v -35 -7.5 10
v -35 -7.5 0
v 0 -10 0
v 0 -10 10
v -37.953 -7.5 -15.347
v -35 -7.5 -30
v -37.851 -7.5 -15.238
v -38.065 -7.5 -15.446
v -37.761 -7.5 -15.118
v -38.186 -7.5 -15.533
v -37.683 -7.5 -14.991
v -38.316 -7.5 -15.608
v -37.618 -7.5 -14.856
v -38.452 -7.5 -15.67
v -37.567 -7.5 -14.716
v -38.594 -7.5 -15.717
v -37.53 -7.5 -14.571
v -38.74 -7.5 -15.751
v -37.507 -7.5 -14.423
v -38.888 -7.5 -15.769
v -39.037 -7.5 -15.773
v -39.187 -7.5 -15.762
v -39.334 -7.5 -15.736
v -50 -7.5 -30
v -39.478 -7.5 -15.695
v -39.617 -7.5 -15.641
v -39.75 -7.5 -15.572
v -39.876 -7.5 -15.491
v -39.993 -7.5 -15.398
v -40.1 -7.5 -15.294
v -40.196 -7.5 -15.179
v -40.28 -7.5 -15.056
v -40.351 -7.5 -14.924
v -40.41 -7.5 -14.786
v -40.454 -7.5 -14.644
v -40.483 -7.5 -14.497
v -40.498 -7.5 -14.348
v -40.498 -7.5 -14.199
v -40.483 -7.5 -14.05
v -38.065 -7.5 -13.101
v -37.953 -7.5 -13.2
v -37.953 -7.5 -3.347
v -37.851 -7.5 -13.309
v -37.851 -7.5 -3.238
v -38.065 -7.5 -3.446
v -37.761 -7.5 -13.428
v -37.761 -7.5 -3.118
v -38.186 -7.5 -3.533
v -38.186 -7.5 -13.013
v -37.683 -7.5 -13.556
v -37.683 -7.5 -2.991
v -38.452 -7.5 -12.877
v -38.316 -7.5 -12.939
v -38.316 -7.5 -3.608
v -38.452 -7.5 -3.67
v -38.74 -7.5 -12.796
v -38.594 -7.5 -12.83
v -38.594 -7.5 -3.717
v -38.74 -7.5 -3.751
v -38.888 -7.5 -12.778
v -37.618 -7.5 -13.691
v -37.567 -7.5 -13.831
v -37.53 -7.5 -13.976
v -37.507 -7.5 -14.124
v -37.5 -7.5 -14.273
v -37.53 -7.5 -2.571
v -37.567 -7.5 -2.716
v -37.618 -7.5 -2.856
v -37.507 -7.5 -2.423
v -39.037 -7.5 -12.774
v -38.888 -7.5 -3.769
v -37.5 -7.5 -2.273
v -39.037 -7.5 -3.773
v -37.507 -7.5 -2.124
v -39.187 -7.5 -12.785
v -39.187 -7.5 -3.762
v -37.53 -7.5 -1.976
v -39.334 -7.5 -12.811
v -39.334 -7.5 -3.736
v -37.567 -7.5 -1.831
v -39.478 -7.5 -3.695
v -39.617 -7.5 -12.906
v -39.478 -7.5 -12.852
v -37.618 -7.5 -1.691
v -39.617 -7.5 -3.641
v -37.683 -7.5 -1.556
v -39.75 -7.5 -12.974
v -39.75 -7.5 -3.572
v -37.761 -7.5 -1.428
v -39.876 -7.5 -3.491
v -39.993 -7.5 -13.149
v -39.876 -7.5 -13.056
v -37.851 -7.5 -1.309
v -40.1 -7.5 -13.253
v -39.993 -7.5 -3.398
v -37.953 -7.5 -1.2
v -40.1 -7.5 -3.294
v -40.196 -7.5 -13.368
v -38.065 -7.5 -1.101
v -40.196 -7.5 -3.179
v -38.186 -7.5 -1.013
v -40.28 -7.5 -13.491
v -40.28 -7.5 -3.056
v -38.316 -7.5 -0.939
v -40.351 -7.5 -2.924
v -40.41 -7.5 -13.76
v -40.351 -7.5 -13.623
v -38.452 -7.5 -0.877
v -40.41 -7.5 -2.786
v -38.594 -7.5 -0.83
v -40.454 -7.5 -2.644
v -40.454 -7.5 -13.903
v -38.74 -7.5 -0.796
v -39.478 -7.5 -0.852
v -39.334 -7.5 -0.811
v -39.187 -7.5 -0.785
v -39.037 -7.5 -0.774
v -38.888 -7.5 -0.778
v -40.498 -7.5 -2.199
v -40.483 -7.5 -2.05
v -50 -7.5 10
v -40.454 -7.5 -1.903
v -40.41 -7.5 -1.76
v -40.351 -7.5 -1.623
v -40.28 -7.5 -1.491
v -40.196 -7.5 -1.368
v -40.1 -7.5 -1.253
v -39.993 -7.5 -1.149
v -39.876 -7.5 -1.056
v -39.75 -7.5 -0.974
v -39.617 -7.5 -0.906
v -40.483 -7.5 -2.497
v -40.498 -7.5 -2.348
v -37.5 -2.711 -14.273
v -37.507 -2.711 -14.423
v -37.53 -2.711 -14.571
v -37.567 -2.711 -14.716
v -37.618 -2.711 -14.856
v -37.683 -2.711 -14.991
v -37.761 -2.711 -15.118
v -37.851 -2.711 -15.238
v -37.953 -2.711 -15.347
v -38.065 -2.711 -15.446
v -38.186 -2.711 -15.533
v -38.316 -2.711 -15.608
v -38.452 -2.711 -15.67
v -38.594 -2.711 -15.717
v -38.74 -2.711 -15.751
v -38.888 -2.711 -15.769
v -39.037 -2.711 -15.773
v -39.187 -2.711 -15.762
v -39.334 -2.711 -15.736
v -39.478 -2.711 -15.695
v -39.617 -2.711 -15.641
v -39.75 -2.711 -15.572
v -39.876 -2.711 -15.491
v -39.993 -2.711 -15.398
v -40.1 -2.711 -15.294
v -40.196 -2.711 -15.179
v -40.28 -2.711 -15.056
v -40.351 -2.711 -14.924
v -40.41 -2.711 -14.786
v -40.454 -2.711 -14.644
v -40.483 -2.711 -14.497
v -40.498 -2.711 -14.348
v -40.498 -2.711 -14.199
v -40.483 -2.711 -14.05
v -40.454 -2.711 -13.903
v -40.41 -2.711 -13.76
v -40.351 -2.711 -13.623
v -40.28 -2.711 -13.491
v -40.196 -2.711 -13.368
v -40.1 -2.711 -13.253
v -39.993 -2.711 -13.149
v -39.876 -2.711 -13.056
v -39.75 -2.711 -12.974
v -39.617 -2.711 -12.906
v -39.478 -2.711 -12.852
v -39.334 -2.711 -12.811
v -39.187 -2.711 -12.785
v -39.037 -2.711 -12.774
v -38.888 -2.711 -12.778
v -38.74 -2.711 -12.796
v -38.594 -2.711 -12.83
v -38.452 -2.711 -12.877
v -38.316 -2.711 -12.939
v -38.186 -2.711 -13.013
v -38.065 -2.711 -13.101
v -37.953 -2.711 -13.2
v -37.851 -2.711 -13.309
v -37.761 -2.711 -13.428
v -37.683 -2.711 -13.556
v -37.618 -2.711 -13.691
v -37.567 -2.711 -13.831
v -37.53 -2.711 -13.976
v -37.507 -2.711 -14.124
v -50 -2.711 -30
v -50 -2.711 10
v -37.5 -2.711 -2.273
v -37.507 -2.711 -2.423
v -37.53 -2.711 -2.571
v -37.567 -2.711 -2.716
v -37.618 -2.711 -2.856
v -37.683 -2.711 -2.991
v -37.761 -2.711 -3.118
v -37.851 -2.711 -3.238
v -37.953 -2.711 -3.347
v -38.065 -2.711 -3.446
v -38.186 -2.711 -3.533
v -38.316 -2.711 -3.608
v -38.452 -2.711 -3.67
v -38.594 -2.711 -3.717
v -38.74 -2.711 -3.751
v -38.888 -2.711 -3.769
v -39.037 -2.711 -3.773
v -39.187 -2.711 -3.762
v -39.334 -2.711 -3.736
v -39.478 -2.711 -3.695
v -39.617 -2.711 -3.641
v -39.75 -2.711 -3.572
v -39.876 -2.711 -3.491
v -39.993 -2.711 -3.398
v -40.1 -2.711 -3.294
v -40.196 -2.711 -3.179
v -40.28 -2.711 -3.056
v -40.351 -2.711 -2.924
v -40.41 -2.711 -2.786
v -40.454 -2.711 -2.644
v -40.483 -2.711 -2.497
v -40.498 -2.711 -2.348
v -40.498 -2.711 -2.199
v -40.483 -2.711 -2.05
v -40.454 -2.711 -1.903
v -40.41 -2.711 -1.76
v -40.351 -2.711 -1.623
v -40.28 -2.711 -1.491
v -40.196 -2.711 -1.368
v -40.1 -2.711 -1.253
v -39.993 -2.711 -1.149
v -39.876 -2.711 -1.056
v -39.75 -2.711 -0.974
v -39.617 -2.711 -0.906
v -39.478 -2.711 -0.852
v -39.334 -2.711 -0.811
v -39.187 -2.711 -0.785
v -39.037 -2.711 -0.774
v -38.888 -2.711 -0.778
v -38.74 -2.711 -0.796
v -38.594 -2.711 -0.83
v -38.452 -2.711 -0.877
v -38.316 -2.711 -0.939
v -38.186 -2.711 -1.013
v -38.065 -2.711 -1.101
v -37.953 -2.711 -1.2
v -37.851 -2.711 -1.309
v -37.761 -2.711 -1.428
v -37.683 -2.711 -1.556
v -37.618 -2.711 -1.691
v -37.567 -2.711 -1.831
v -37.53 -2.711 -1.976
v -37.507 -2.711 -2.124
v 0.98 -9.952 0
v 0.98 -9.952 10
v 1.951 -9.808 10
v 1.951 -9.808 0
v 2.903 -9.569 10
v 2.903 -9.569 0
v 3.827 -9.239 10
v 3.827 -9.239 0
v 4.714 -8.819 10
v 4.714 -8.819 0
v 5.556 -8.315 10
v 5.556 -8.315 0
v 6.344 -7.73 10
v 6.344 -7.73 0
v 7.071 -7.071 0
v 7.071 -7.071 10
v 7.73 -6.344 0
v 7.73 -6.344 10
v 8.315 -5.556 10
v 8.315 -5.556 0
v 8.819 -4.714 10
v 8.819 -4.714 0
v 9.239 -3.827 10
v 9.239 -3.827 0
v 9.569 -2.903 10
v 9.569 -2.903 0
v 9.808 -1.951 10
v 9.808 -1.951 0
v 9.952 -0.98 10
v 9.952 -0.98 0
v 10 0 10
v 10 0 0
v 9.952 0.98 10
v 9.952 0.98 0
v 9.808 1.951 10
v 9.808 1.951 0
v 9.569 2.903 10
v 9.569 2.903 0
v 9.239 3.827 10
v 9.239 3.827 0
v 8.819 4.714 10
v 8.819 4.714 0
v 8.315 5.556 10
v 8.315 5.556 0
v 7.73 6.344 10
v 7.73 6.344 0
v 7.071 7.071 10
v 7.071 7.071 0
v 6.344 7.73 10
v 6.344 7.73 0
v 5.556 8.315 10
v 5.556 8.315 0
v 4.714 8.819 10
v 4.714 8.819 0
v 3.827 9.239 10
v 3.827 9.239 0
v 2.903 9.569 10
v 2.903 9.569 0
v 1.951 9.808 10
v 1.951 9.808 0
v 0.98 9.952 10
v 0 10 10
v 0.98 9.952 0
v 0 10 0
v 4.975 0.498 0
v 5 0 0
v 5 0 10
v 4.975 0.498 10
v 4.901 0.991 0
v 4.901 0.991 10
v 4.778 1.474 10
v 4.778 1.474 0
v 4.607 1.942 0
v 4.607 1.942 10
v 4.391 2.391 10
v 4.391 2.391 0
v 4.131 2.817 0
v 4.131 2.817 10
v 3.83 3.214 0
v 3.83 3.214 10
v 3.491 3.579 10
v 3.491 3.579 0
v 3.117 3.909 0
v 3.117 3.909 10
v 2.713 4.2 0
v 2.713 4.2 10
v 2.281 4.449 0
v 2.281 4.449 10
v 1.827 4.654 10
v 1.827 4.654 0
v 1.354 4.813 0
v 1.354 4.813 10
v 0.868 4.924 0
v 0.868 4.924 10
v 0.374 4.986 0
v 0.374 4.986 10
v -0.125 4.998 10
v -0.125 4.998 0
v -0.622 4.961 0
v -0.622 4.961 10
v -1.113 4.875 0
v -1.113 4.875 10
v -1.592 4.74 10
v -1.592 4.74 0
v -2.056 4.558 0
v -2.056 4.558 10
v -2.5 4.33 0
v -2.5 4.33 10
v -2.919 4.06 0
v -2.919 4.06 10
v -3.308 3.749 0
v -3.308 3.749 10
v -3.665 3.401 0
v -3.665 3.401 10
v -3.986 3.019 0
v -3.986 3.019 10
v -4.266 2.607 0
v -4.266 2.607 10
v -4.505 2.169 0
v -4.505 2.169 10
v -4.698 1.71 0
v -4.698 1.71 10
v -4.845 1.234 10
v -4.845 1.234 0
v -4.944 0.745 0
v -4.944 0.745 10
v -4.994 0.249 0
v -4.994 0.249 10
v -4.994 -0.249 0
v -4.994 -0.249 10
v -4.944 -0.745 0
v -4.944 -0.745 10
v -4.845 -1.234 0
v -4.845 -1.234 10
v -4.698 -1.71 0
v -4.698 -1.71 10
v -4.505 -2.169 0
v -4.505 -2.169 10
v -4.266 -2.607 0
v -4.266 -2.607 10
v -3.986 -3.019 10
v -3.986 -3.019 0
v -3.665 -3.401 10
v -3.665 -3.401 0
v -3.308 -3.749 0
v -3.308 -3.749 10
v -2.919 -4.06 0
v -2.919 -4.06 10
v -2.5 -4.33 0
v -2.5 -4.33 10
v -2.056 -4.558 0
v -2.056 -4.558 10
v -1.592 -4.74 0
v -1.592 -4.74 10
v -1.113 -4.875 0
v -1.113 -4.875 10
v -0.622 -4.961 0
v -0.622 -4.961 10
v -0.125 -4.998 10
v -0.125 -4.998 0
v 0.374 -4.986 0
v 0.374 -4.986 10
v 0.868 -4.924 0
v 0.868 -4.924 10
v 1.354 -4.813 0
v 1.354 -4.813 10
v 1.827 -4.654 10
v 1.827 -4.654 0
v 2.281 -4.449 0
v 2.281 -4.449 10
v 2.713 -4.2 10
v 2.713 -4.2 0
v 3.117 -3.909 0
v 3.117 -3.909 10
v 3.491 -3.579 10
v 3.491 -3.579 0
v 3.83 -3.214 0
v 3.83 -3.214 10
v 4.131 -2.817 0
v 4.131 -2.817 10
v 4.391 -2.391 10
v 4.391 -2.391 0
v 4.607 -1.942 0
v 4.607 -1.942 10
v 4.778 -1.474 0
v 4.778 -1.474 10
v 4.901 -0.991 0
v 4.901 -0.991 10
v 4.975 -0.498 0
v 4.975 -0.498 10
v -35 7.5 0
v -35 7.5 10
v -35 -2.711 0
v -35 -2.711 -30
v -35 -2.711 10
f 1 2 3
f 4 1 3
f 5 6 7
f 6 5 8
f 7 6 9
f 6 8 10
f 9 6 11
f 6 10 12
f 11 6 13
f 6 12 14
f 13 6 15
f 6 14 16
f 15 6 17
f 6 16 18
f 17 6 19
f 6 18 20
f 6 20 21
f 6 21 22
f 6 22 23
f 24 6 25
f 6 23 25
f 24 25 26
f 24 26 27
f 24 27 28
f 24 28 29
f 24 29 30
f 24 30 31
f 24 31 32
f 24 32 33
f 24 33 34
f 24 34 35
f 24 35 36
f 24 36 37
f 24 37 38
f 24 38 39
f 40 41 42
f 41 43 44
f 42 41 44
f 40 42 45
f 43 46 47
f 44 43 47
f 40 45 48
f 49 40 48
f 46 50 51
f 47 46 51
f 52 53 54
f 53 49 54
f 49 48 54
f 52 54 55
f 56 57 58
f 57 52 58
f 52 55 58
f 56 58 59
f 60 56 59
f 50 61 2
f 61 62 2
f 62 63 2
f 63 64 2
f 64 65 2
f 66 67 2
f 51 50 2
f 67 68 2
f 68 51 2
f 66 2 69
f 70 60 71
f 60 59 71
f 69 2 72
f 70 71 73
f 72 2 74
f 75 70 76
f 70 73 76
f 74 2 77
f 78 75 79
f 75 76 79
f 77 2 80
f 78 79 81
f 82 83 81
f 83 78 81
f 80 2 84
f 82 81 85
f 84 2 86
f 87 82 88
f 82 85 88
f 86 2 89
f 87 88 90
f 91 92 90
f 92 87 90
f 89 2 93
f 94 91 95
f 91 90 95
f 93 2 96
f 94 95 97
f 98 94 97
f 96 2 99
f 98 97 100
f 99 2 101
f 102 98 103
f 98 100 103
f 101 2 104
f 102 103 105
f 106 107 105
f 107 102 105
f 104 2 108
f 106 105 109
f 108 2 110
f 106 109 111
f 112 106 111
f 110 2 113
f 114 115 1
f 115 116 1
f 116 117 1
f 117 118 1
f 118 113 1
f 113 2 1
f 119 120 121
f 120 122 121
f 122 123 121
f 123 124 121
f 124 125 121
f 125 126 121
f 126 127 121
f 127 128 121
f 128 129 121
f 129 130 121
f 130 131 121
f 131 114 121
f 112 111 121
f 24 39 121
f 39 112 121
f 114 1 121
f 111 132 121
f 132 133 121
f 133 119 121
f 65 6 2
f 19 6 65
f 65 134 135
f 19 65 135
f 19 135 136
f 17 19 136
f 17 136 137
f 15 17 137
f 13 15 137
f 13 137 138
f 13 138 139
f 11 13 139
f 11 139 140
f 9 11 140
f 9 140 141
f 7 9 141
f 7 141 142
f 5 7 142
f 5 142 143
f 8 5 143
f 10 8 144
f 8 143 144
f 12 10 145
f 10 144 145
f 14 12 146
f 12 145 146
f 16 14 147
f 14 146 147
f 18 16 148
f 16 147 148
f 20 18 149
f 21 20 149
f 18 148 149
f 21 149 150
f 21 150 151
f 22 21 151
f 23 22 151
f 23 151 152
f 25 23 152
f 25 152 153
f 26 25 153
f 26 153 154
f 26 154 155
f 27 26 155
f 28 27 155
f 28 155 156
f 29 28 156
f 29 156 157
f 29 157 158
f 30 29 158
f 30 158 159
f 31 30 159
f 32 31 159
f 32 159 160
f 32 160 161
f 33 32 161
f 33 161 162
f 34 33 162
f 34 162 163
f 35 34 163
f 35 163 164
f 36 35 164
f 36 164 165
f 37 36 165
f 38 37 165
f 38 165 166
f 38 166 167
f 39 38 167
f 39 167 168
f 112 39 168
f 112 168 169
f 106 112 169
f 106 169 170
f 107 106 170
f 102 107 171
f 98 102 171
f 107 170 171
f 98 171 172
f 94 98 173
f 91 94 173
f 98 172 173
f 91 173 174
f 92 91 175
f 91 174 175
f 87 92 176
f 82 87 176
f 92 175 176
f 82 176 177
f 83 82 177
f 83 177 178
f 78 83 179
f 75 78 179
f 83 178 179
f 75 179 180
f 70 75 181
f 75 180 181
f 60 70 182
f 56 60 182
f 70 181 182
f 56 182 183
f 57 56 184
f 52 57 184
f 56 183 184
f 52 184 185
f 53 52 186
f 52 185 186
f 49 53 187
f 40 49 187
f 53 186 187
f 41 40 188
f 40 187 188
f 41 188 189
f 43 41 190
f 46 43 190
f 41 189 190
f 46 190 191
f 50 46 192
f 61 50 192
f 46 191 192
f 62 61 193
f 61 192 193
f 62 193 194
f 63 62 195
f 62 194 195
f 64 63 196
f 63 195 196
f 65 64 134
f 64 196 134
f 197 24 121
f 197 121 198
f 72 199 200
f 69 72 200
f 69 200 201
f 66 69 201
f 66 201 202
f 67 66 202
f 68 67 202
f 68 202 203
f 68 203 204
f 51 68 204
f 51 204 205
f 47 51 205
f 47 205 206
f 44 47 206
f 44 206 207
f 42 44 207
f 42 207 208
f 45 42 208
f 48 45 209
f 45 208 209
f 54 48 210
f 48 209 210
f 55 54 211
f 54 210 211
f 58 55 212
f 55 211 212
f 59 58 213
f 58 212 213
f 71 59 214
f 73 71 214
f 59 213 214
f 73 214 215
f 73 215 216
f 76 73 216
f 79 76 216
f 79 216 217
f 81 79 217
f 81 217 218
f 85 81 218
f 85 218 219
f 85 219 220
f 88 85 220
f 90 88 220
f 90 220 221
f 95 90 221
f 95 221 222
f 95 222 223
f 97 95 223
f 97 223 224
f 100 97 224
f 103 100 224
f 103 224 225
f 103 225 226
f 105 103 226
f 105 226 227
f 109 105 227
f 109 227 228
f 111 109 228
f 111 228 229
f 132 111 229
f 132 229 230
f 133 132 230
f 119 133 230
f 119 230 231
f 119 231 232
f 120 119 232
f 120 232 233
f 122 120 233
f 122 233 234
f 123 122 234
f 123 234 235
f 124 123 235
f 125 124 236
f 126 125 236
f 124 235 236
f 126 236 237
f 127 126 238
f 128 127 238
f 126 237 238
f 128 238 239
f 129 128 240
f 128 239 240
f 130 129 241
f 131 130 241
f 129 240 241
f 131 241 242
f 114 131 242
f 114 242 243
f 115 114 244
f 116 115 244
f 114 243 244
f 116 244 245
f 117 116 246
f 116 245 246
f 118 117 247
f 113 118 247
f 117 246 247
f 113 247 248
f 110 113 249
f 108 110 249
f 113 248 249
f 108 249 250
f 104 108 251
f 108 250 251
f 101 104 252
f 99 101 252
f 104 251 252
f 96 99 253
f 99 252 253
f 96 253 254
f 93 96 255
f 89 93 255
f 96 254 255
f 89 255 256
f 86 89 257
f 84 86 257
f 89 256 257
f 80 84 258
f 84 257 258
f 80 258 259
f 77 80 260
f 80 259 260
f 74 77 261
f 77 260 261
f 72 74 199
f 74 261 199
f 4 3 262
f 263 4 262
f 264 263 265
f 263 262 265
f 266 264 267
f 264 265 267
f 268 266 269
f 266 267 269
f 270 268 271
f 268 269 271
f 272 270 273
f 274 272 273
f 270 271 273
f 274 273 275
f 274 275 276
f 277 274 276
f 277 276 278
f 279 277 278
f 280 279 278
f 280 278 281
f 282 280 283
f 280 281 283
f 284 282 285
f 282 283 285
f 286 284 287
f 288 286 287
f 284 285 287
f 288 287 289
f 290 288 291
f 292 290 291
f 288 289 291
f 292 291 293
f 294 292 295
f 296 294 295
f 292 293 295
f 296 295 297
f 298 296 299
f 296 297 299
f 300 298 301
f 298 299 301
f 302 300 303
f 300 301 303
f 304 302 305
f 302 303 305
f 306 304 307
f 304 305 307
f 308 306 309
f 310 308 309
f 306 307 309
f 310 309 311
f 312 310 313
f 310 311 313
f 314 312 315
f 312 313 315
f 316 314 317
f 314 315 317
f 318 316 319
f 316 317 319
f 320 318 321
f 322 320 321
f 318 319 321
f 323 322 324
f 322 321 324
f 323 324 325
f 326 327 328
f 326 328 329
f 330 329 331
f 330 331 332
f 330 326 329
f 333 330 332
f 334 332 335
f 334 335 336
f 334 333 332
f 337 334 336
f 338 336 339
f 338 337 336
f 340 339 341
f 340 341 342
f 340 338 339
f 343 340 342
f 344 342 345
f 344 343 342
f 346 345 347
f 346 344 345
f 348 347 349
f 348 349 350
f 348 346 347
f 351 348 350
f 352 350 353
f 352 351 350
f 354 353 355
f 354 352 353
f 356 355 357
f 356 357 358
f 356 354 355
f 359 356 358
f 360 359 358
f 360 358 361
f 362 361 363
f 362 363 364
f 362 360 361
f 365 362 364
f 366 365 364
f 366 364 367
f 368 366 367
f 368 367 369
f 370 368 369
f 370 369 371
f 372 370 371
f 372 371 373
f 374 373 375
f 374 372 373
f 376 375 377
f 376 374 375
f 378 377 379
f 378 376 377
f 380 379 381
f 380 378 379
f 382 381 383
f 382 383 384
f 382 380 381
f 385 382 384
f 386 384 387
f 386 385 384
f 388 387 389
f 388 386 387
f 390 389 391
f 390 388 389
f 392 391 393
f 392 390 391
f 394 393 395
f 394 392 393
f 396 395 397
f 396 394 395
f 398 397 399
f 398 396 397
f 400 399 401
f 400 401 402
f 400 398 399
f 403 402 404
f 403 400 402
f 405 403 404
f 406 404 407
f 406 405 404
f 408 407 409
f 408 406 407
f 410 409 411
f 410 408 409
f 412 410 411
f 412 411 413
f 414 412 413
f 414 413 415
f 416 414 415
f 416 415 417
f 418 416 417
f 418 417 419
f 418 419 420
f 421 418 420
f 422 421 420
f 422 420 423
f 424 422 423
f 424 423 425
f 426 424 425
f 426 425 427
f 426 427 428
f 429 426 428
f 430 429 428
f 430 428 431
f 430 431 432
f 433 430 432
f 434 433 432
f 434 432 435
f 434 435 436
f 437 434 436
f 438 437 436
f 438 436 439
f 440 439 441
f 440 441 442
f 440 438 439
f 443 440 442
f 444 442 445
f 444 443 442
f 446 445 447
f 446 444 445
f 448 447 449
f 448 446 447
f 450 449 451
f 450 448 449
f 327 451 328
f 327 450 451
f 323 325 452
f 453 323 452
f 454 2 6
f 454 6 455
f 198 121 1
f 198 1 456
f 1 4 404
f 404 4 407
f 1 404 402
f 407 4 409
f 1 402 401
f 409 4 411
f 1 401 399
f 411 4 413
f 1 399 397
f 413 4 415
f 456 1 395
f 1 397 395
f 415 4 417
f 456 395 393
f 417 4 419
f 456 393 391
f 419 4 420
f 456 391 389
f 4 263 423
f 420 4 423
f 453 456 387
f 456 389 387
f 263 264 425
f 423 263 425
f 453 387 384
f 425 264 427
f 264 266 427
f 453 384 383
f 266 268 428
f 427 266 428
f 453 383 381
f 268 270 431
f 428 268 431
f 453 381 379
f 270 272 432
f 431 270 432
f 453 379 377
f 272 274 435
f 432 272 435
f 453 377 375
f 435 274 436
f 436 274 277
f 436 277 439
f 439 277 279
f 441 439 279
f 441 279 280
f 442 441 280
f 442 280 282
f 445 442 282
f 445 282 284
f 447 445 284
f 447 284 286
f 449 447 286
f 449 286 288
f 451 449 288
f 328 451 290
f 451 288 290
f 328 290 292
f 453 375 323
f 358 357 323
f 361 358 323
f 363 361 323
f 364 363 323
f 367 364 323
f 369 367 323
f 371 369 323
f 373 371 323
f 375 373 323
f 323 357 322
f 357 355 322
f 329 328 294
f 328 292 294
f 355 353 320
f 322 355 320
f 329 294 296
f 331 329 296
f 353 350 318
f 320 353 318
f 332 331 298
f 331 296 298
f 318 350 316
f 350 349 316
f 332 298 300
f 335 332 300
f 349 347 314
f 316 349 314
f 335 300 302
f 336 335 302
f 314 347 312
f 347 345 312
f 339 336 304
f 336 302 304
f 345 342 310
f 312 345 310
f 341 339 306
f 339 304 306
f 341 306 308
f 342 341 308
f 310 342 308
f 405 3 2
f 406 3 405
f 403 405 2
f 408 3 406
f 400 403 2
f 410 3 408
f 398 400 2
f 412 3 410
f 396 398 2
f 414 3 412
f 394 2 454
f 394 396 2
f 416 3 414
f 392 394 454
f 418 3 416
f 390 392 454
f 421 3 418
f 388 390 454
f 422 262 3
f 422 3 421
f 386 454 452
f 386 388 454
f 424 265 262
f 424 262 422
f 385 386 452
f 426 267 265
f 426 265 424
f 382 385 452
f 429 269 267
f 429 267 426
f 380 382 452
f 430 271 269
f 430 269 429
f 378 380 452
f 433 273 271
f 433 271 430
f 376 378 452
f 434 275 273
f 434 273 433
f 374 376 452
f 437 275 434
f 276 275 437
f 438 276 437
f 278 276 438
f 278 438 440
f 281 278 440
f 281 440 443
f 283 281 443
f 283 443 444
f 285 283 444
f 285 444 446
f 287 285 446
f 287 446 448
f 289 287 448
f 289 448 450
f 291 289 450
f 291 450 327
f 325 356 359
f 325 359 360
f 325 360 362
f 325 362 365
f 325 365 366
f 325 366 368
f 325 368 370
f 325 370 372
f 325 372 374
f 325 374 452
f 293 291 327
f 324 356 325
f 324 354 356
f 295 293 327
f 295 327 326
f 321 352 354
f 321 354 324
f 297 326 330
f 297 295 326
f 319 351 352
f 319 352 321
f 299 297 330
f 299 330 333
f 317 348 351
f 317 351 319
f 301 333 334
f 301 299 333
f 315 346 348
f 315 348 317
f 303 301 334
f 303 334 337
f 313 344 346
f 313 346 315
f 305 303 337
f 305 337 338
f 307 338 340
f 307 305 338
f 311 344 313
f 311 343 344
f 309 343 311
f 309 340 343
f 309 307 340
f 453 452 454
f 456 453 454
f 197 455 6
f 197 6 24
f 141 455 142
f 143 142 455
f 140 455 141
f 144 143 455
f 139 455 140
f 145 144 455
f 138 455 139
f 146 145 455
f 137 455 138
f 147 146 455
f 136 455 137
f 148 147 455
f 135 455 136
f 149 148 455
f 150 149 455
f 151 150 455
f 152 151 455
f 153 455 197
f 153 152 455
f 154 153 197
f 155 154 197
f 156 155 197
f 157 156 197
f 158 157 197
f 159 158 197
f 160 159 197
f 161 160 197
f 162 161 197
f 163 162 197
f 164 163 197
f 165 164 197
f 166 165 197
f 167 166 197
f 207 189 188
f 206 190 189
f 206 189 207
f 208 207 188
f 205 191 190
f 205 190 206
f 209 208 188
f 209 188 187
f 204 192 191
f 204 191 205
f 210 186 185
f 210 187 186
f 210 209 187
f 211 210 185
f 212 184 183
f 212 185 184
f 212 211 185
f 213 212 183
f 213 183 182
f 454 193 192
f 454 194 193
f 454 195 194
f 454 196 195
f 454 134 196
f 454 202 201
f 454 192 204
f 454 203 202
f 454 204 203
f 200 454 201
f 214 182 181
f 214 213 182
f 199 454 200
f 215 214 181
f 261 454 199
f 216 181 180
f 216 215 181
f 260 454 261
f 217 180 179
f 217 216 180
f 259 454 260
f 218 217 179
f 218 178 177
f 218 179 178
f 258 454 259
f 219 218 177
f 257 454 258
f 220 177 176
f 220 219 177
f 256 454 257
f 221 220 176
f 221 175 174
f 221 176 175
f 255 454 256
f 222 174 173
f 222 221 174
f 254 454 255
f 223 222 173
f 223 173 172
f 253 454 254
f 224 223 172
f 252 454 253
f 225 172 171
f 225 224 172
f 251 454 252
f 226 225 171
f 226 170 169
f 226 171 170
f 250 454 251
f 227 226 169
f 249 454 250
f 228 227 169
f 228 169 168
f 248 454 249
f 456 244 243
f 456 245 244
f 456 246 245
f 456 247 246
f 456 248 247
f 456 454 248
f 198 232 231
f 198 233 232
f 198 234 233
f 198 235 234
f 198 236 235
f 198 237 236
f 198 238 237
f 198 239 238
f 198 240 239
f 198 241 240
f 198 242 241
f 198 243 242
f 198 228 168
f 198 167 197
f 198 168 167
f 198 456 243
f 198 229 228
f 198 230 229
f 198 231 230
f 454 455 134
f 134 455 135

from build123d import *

# Parameters (mm, degrees)
SKETCH1_R           = 5
BOSS_EXTRUDE1_DEPTH = 10
SKETCH3_W           = 10
SKETCH3_H           = 4.789047851
BOSS_EXTRUDE2_DEPTH = 15
SKETCH4_W           = 15
SKETCH4_H           = 4.789047851
BOSS_EXTRUDE3_DEPTH = 30
CUT_EXTRUDE1_REACH  = 9.289
SKETCH5_R           = 1.5


with BuildPart() as part:
    # Sketch1 → Boss-Extrude1 (new body)
    with BuildSketch(Plane.XY):
        with BuildLine():
            Line((0, 10), (-35, 7.5))
            Line((-35, 7.5), (-35, -7.5))
            Line((-35, -7.5), (0, -10))
            ThreePointArc((0, -10), (10, 0), (0, 10))
        make_face()
        Circle(SKETCH1_R, mode=Mode.SUBTRACT)
    extrude(amount=BOSS_EXTRUDE1_DEPTH)

    # Sketch3 → Boss-Extrude2 (add)
    with BuildSketch(Plane.ZY.offset(35)):
        with Locations((5, -5.105476075)):
            Rectangle(SKETCH3_W, SKETCH3_H)
    extrude(amount=BOSS_EXTRUDE2_DEPTH)

    # Sketch4 → Boss-Extrude3 (add)
    with BuildSketch(Plane(origin=(0, 0, 0), x_dir=(-1, 0, 0), z_dir=(0, 0, -1))):
        with Locations((42.5, -5.105476075)):
            Rectangle(SKETCH4_W, SKETCH4_H)
    extrude(amount=BOSS_EXTRUDE3_DEPTH)

    # Sketch5 → Cut-Extrude1 (cut, up to next)
    with BuildSketch(Plane(origin=(0, -2.710952149, 0), x_dir=(1, 0, 0), z_dir=(0, 1, 0)), mode=Mode.PRIVATE) as cut_extrude1_sk1:
        with Locations((-39, 2.273461037)):
            Circle(SKETCH5_R)
    cut_extrude1_tool1 = extrude(cut_extrude1_sk1.sketch, amount=-CUT_EXTRUDE1_REACH, mode=Mode.PRIVATE) & part.part
    add(cut_extrude1_tool1.solids().sort_by_distance((-39, -2.710952, -2.273461))[0], mode=Mode.SUBTRACT)
    # Sketch5 → Cut-Extrude1 (cut, up to next)
    with BuildSketch(Plane(origin=(0, -2.710952149, 0), x_dir=(1, 0, 0), z_dir=(0, 1, 0)), mode=Mode.PRIVATE) as cut_extrude1_sk2:
        with Locations((-39, 14.273461037)):
            Circle(SKETCH5_R)
    cut_extrude1_tool2 = extrude(cut_extrude1_sk2.sketch, amount=-CUT_EXTRUDE1_REACH, mode=Mode.PRIVATE) & part.part
    add(cut_extrude1_tool2.solids().sort_by_distance((-39, -2.710952, -14.273461))[0], mode=Mode.SUBTRACT)


solid = part.part
